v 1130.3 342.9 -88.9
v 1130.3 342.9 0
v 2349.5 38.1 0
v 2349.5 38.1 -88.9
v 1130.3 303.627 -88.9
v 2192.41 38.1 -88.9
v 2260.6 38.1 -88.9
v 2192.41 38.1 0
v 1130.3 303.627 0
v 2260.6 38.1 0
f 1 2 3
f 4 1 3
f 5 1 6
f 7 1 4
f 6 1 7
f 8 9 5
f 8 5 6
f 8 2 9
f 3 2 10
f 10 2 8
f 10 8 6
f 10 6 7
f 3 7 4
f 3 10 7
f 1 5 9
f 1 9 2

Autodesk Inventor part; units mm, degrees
ref_plane "YZ Plane" through (0, 0, 0) normal (1, 0, 0) x (0, 1, 0)
ref_plane "XZ Plane" through (0, 0, 0) normal (0, 1, 0) x (-1, 0, 0)
ref_plane "XY Plane" through (0, 0, 0) normal (0, 0, 1) x (1, 0, 0)
ref_plane "Work Plane1" through (0, 0, 0) normal (0, 0, 1) x (1, 0, 0)
sketch "Sketch1" plane through (0, 0, 0) normal (0, 0, 1) x (1, 0, 0)
  line L0 (-88.9, 0) -> (0, 0) projected
  line L1 (0, 0) -> (0, 38.1) projected
  line L2 (-88.9, 38.1) -> (0, 38.1) projected
  line L3 (-88.9, 0) -> (-88.9, 38.1) projected
  line L4 (0, 0) -> (2260.6, 0) projected
  line L5 (2260.6, 0) -> (2260.6, 38.1) projected
  line L6 (0, 38.1) -> (2260.6, 38.1) projected
  line L7 (0, 0) -> (0, 38.1) projected
  line L8 (2260.6, 0) -> (2349.5, 0) projected
  line L9 (2349.5, 0) -> (2349.5, 38.1) projected
  line L10 (2260.6, 38.1) -> (2349.5, 38.1) projected
  line L11 (2260.6, 0) -> (2260.6, 38.1) projected
  line L12 (1130.3, 38.1) -> (1130.3, 342.9)
  line L13 (1130.3, 342.9) -> (2349.5, 38.1)
  line L14 (1130.3, 342.9) -> (1121.0594, 305.9376)
  line L15 (1121.0594, 305.9376) -> (2192.4097, 38.1)
  point P0 (1130.3, 303.6274)
  dimension "d0" = 304.8
  dimension "d2" = 90
  dimension "d4" = 38.1
extrude "Extrusion1" add sketch "Sketch1" against normal blind 88.9 contours L6 L15 L12 L13 L10
properties part number "top head slant"
